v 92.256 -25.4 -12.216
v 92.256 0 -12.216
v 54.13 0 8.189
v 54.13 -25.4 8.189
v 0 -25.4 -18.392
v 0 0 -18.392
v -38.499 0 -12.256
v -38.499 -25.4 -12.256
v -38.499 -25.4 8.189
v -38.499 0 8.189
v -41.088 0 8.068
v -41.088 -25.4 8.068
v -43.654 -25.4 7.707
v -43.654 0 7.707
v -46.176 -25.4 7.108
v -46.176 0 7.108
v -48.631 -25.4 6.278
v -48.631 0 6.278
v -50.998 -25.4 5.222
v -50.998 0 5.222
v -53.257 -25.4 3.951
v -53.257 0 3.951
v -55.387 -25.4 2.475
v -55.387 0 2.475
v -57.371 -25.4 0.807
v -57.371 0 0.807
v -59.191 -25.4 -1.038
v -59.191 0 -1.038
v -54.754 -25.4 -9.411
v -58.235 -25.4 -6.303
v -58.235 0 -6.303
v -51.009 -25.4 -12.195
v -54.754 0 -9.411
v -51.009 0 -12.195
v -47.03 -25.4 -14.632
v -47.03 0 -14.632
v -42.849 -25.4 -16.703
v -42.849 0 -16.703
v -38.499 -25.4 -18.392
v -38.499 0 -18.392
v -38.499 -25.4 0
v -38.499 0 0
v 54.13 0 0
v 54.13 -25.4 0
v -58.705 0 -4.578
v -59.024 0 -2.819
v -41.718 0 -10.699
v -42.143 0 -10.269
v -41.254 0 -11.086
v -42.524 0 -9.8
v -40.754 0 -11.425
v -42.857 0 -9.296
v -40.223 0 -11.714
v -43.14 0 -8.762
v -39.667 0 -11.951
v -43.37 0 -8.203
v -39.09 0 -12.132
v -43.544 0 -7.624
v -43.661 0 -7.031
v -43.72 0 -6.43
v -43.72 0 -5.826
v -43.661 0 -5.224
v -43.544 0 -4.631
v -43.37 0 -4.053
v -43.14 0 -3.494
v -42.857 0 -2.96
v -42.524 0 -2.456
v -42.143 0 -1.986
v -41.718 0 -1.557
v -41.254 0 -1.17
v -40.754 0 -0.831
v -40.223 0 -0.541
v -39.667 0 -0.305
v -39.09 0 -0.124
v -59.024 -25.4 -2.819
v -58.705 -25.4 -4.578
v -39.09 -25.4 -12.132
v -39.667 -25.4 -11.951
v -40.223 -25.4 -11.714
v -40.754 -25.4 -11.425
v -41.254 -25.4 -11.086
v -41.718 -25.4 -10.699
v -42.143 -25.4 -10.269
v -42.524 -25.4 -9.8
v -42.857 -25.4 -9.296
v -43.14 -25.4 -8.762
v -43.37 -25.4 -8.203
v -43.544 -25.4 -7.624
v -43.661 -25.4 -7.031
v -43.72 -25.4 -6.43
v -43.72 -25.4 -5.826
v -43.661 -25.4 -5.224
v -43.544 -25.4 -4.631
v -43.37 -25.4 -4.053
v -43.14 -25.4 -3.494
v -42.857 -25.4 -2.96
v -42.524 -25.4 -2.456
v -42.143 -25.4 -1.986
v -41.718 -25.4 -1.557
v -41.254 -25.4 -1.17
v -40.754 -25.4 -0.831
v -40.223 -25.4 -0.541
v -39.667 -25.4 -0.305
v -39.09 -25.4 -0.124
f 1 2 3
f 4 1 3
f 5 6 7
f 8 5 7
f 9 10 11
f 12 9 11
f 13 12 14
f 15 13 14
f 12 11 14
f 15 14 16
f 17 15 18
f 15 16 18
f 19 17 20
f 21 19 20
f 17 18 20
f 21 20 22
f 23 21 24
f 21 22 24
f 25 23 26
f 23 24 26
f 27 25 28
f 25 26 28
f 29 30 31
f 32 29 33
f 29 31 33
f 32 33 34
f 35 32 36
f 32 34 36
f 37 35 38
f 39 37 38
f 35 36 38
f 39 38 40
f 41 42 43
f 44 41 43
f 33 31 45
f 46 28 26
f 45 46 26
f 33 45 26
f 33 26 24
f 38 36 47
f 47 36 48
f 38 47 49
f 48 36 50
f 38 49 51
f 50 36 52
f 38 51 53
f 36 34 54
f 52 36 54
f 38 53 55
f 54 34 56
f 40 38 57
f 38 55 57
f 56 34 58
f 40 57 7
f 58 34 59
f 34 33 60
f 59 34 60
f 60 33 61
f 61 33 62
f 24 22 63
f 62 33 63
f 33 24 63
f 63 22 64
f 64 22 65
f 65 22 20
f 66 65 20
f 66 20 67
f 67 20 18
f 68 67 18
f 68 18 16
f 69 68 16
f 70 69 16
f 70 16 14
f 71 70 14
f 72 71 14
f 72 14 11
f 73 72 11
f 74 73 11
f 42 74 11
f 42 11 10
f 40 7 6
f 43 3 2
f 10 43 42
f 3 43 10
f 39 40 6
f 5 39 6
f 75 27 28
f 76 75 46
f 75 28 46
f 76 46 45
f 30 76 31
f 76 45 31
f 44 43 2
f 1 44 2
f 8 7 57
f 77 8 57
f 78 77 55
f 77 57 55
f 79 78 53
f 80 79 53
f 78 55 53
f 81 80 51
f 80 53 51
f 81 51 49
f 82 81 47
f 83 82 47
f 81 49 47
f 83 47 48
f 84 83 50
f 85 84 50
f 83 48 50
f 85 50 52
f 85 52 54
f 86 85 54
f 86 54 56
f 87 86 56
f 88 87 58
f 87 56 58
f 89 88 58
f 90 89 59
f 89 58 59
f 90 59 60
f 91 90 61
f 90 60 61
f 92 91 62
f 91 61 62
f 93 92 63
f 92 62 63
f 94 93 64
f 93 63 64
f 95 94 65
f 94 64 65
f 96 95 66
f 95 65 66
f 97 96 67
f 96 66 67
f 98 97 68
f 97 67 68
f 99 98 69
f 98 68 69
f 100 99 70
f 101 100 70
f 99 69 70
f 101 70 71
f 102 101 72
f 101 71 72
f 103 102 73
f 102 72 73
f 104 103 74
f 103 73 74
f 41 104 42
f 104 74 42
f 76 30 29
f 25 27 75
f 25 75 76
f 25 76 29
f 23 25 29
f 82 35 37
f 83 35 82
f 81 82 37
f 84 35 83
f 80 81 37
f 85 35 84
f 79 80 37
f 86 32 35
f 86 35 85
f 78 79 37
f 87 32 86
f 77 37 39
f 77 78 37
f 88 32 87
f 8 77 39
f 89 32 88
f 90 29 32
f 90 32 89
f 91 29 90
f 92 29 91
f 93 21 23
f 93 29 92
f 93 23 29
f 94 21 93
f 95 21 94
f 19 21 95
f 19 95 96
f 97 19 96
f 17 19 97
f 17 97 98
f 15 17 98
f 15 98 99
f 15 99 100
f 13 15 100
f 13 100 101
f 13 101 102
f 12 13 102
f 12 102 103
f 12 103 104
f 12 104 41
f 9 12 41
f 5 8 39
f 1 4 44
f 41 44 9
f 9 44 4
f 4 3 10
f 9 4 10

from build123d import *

# Parameters (mm, degrees)
F1_DEPTH = 25.4


# Not quite as in the source:
# - the program builds the solid bodies; features that only make, move or delete a surface that nothing else refers to are left out


with BuildPart() as f1:
    # F0 (on Front) → F1 (new body)
    with BuildSketch(Plane.XZ):
        with BuildLine():
            Line((-38.4986028075, 0), (54.1304424405, 0))
            Line((54.1304424405, 0), (92.2559946775, -12.2162923217))
            Line((92.2559946775, -12.2162923217), (54.1304424405, 8.1889424473))
            Line((54.1304424405, 8.1889424473), (-38.4986028075, 8.1889424473))
            ThreePointArc((-38.4986028075, 8.1889424473), (-49.8267048533, 5.777561047), (-59.1905941264, -1.0384666745))
            ThreePointArc((-59.1905941264, -1.0384666745), (-58.8832559342, -3.7017340098), (-58.2345825442, -6.3030168658))
            ThreePointArc((-58.2345825442, -6.3030168658), (-49.0469266103, -13.4580145444), (-38.4986028075, -18.3915607631))
            Line((-38.4986028075, -18.3915607631), (0, -18.3915607631))
            Line((0, -18.3915607631), (-38.4986028075, -12.2556750716))
            ThreePointArc((-38.4986028075, -12.2556750716), (-43.7271300367, -6.1278375358), (-38.4986028075, 0))
        make_face()
    extrude(amount=F1_DEPTH)


solid = f1.part
